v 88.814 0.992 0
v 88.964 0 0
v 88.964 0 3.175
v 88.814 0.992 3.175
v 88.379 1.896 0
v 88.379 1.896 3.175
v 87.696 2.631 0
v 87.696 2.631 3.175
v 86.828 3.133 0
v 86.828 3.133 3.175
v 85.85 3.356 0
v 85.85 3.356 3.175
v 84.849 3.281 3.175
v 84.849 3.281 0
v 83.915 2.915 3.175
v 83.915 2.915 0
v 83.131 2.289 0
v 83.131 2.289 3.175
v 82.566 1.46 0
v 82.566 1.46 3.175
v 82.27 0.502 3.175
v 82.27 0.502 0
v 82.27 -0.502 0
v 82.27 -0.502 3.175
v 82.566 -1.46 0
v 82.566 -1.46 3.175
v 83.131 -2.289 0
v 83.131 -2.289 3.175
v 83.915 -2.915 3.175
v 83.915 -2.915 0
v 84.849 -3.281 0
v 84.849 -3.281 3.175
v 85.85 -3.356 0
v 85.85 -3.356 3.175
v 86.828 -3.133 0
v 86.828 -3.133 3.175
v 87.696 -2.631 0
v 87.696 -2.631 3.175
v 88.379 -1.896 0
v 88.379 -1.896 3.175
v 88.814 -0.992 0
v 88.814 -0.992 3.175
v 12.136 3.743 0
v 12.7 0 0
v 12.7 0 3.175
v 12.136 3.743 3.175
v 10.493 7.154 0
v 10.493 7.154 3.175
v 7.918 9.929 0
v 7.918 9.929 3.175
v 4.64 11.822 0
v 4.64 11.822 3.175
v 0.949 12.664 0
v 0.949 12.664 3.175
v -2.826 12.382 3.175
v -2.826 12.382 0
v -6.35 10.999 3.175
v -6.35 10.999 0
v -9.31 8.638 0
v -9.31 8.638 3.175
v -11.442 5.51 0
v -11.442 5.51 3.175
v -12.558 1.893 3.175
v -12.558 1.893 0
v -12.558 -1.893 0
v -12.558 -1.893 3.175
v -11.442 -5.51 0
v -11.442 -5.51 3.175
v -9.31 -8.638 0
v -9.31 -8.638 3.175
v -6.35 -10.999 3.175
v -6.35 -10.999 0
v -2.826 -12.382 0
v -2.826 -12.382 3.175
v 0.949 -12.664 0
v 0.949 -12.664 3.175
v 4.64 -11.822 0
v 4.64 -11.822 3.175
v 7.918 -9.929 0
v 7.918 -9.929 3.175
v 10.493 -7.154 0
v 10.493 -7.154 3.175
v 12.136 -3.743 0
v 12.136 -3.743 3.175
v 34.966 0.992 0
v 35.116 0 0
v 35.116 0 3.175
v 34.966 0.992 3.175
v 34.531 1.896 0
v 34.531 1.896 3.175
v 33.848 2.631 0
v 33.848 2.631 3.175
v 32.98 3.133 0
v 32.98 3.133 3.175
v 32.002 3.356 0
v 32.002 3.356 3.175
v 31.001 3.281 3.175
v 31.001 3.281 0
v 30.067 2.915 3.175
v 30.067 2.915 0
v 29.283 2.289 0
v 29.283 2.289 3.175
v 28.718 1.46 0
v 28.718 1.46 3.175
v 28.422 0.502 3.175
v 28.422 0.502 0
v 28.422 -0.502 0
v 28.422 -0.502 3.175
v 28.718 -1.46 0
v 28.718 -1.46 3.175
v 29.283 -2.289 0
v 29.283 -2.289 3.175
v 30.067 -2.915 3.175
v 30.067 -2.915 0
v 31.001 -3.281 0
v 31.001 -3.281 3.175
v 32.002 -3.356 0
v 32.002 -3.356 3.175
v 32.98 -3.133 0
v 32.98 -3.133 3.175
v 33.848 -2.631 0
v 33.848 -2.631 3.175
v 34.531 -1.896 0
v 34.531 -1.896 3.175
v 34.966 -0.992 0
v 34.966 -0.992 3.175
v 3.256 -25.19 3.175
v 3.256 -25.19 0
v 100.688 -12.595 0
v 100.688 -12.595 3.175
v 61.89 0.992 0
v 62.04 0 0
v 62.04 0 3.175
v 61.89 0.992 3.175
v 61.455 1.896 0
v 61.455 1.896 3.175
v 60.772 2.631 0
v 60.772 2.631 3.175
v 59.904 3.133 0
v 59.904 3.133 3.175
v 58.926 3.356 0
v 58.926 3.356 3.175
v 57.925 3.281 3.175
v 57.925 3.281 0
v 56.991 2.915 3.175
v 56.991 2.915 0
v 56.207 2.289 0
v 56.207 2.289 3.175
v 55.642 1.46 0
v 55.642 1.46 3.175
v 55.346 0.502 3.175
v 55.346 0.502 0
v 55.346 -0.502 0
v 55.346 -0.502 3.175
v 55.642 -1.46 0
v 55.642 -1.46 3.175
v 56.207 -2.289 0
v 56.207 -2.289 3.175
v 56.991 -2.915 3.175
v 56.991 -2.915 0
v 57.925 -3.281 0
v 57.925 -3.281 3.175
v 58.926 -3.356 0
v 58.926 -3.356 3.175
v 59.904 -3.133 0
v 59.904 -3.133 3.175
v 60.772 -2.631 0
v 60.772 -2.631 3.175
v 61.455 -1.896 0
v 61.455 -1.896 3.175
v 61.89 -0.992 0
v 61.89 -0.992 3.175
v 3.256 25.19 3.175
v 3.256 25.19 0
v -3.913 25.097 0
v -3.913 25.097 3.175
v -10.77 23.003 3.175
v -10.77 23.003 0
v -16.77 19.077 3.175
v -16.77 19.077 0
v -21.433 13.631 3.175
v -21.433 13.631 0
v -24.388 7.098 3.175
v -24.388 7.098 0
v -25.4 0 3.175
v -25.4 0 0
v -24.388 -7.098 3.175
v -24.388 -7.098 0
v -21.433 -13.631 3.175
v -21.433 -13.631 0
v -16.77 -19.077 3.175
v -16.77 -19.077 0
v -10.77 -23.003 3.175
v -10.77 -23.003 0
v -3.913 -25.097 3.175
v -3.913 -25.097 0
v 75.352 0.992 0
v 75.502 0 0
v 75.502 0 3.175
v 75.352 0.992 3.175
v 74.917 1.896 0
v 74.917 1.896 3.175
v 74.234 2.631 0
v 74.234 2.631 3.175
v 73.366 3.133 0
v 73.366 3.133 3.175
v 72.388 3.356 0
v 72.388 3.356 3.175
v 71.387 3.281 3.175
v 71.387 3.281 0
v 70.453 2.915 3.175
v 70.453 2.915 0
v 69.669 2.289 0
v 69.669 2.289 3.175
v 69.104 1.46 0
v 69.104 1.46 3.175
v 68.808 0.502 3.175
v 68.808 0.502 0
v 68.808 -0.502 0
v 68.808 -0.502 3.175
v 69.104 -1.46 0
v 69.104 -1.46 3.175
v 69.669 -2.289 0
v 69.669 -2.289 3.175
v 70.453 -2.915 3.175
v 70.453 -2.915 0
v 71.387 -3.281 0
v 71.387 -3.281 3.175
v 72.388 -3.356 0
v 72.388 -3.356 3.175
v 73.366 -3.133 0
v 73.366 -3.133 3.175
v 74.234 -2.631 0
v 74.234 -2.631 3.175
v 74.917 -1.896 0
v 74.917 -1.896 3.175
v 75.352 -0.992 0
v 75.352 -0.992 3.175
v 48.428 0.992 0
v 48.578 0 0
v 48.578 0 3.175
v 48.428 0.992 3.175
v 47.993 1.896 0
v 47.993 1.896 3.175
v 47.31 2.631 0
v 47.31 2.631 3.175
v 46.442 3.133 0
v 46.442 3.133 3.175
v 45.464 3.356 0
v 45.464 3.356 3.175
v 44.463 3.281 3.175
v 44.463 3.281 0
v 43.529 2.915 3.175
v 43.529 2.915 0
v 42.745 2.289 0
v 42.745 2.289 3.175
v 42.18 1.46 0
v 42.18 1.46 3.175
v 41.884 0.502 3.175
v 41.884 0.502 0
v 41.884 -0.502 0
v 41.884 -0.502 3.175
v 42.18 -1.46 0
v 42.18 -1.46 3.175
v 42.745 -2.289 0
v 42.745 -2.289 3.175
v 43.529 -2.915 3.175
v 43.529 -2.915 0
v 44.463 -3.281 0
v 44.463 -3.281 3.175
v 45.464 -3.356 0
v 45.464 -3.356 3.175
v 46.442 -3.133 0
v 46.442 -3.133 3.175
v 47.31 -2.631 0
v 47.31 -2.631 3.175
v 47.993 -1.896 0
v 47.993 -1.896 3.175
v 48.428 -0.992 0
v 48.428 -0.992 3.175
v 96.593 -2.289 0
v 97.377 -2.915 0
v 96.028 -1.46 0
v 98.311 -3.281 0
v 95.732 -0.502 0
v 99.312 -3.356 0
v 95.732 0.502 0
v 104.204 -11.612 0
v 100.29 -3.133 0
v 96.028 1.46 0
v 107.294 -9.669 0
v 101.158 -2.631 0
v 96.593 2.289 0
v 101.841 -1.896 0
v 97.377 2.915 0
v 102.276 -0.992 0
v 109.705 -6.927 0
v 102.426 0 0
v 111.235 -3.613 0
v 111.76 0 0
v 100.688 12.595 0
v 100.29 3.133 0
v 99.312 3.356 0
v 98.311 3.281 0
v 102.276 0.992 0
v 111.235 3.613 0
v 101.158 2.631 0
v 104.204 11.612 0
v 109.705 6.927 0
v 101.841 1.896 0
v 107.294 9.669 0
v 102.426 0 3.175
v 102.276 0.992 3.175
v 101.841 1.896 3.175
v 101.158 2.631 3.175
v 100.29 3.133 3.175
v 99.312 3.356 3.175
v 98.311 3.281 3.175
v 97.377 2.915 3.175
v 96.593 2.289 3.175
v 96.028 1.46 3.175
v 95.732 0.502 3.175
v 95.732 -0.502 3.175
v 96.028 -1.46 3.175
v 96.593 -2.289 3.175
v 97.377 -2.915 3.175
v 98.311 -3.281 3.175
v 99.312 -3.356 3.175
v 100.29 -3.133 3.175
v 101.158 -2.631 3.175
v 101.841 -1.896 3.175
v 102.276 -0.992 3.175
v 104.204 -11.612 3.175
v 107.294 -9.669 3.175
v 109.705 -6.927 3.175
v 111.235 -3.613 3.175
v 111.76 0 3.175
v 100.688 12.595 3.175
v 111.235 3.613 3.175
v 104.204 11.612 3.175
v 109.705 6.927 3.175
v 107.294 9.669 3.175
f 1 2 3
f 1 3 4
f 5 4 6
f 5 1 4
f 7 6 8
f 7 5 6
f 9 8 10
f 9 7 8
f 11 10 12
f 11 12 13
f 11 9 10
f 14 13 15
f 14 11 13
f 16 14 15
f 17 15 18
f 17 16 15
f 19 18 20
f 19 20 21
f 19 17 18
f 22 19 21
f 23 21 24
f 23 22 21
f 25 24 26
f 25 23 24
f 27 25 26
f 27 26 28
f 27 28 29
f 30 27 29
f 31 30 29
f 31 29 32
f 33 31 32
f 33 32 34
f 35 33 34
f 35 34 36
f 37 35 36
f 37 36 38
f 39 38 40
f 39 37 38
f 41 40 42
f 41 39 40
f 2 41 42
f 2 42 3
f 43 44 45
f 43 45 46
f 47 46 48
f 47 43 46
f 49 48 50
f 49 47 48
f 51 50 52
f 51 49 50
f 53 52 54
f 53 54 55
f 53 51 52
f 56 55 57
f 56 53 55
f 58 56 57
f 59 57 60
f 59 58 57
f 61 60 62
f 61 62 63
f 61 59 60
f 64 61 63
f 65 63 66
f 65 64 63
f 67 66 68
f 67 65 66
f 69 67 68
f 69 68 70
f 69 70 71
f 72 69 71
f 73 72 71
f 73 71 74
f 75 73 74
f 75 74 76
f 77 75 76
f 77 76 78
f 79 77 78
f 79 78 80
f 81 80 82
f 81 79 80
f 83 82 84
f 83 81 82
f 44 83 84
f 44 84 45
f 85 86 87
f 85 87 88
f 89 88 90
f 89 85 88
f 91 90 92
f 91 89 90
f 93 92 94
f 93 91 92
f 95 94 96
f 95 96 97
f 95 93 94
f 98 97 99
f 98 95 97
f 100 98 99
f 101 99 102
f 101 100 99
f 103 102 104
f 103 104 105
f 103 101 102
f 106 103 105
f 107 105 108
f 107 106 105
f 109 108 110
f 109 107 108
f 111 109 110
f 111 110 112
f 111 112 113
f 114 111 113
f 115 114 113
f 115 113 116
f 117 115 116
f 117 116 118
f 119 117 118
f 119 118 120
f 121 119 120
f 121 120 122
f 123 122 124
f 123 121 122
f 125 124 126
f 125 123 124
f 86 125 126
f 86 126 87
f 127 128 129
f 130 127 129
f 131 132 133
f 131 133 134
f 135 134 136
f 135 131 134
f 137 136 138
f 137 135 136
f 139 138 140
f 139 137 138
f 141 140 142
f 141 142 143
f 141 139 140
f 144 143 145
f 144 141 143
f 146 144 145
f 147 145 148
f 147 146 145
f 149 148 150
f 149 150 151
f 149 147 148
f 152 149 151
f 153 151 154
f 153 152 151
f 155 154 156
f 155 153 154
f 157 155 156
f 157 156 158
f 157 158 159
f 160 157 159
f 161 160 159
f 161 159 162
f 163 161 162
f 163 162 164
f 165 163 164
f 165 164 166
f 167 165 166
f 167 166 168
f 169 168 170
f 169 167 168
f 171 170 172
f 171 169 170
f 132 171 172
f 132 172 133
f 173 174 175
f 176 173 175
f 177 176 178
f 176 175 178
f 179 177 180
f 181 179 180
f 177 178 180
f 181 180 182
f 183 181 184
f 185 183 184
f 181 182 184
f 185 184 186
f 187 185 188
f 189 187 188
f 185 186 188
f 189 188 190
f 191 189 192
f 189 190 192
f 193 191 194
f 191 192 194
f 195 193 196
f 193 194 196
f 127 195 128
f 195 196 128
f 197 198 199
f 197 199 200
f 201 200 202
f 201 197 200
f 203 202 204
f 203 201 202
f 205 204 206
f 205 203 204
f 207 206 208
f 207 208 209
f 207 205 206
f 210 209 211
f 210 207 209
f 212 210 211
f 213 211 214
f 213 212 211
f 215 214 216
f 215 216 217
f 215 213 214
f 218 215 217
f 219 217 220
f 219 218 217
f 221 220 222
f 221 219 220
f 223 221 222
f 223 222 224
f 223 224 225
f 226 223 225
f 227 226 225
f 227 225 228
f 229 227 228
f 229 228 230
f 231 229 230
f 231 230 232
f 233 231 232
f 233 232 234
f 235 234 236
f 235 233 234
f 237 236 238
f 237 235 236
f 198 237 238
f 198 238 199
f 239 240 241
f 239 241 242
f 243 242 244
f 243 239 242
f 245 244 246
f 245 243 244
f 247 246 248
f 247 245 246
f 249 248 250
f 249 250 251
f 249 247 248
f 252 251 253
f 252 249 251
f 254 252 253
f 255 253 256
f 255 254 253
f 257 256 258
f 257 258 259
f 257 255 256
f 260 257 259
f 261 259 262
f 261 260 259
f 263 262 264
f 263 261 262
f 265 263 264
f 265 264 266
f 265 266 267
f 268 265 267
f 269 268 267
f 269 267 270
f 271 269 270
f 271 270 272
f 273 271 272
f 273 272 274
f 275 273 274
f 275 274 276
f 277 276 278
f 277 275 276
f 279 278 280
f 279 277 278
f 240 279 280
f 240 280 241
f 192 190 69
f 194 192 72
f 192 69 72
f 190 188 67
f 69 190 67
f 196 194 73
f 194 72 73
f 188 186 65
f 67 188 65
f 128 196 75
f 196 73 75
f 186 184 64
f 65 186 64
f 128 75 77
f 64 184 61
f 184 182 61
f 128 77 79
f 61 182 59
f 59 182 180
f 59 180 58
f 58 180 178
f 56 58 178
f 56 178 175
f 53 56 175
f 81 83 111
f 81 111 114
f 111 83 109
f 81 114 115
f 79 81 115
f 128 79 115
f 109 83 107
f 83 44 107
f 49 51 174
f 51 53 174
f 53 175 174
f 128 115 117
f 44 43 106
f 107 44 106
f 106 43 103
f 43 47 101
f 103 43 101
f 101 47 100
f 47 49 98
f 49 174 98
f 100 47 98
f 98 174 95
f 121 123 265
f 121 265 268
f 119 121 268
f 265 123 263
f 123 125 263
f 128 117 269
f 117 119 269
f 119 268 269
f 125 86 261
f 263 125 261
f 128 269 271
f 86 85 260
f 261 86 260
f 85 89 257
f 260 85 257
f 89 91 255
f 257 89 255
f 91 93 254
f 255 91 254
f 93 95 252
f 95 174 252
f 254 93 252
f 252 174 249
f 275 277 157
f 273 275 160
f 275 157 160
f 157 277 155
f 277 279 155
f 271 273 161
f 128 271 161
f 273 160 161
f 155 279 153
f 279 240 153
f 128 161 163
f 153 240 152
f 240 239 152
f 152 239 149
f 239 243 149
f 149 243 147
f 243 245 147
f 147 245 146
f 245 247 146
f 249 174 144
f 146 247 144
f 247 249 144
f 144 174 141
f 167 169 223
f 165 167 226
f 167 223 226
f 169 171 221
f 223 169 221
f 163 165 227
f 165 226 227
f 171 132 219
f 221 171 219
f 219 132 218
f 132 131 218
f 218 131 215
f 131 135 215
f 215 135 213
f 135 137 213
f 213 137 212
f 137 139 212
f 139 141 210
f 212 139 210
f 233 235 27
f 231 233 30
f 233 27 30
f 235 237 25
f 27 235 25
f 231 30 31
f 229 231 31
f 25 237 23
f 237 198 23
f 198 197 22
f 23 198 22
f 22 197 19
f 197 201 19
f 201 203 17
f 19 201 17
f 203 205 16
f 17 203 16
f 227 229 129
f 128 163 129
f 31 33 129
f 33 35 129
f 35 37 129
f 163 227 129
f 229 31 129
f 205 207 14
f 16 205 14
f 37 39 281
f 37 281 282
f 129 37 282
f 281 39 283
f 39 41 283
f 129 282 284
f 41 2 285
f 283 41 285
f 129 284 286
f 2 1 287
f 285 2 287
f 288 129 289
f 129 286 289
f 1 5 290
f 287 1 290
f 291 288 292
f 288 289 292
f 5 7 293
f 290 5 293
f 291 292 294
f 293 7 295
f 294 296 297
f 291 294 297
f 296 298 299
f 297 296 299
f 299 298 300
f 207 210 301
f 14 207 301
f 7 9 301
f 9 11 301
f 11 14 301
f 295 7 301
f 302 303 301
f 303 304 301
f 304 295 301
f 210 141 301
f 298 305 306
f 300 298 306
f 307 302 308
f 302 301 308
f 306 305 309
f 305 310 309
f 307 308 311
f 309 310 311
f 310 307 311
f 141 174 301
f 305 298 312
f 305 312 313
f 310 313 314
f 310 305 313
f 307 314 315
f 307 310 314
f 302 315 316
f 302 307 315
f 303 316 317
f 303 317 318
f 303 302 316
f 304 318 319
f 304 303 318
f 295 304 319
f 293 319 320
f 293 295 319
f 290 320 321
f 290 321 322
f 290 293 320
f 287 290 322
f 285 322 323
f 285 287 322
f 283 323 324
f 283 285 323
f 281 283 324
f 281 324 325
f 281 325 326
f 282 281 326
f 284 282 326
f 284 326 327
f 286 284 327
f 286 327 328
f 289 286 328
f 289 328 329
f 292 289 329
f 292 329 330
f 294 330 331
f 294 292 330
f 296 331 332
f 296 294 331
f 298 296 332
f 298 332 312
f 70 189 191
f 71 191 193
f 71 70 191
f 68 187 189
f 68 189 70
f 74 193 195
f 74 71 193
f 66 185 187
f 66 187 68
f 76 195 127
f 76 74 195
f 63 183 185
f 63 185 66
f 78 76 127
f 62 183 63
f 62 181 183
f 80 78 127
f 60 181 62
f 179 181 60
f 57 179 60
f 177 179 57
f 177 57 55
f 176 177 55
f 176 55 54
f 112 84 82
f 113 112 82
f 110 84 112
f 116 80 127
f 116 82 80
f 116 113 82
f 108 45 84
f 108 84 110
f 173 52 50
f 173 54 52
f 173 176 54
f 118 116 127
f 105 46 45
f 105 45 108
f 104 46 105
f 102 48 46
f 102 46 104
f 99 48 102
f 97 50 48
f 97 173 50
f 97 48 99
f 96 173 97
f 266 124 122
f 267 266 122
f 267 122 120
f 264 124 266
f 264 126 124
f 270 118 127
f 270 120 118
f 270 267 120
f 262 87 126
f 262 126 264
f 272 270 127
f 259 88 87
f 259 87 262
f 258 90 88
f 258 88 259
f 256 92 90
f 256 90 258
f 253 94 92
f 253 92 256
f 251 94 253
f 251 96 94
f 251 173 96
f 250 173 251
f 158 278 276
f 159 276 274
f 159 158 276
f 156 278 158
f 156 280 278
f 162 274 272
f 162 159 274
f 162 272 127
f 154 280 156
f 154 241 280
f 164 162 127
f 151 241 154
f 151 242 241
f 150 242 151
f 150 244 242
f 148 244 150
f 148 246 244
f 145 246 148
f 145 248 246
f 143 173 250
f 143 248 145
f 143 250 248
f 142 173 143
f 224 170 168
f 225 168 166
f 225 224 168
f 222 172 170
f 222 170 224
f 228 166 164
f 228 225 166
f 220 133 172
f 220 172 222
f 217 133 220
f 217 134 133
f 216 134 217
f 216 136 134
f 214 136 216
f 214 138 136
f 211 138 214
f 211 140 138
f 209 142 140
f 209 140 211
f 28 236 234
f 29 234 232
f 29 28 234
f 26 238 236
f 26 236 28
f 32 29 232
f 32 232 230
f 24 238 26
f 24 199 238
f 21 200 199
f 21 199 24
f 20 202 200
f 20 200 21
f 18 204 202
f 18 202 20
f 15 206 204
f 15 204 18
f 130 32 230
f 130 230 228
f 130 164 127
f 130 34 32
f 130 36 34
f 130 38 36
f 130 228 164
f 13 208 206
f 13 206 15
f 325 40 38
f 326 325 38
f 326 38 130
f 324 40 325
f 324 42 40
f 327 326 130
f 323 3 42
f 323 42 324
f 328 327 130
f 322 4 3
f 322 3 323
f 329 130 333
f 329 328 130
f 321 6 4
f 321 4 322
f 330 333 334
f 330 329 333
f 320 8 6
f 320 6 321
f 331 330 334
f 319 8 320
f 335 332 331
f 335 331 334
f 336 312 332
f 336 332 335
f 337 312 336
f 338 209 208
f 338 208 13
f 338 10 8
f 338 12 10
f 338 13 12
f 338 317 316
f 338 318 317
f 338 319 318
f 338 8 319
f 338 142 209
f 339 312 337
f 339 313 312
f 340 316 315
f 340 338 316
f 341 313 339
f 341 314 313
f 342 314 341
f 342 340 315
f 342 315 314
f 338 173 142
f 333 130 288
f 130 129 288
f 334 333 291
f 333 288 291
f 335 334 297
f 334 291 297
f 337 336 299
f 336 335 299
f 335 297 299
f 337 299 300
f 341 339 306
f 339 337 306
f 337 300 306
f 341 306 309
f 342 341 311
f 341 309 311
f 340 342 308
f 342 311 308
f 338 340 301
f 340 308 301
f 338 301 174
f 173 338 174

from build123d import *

# Parameters (mm, degrees)
FLAT_SKETCH_R           = 25.4
FLAT_SKETCH_R_2         = 12.7
FLAT_SKETCH_R_3         = 3.3655
EXTRUDE_FACE_DEPTH      = 3.175
FLAT_SKETCH_4_R         = 3.3655
EXTRUDE_CUT_HOLES_DEPTH = 3.175


with BuildPart() as part:
    # Flat sketch → Extrude face (new body)
    # profile 1 of 13: a face of its own
    with BuildSketch(Plane.XY):
        Circle(FLAT_SKETCH_R)
        Circle(FLAT_SKETCH_R_2, mode=Mode.SUBTRACT)
    # profile 2 of 13: a face of its own
    with BuildSketch(Plane.XY):
        with BuildLine():
            Line((100.688205128, 12.595195436), (3.256410256, 25.190390871))
            ThreePointArc((3.256410256, 25.190390871), (19.077117451, 16.769722411), (25.4, 0))
            ThreePointArc((25.4, 0), (19.077117451, -16.769722411), (3.256410256, -25.190390871))
            Line((3.256410256, -25.190390871), (100.688205128, -12.595195436))
            ThreePointArc((100.688205128, -12.595195436), (91.936966729, -10.514389997), (86.759121462, -3.158858528))
            ThreePointArc((86.759121462, -3.158858528), (82.2325, 0), (86.759121462, 3.158858528))
            ThreePointArc((86.759121462, 3.158858528), (91.936966729, 10.514389997), (100.688205128, 12.595195436))
        make_face()
        with Locations((31.75, 0)):
            Circle(FLAT_SKETCH_R_3, mode=Mode.SUBTRACT)
        with Locations((45.212, 0)):
            Circle(FLAT_SKETCH_R_3, mode=Mode.SUBTRACT)
        with Locations((58.674, 0)):
            Circle(FLAT_SKETCH_R_3, mode=Mode.SUBTRACT)
        with Locations((72.136, 0)):
            Circle(FLAT_SKETCH_R_3, mode=Mode.SUBTRACT)
    # profile 3 of 13: a face of its own
    with BuildSketch(Plane.XY):
        with Locations((31.75, 0)):
            Circle(FLAT_SKETCH_R_3)
    # profile 4 of 13: a face of its own
    with BuildSketch(Plane.XY):
        with Locations((45.212, 0)):
            Circle(FLAT_SKETCH_R_3)
    # profile 5 of 13: a face of its own
    with BuildSketch(Plane.XY):
        with Locations((58.674, 0)):
            Circle(FLAT_SKETCH_R_3)
    # profile 6 of 13: a face of its own
    with BuildSketch(Plane.XY):
        with Locations((72.136, 0)):
            Circle(FLAT_SKETCH_R_3)
    # profile 7 of 13: a face of its own
    with BuildSketch(Plane.XY):
        with Locations((99.06, 0)):
            Circle(FLAT_SKETCH_R_2)
    # profile 8 of 13: a face of its own
    with BuildSketch(Plane.XY):
        with Locations((85.598, 0)):
            Circle(FLAT_SKETCH_R_3)
    # profile 9 of 13: a face of its own
    with BuildSketch(Plane.XY):
        with Locations((85.598, 0)):
            Circle(FLAT_SKETCH_R_3)
    # profile 10 of 13: a face of its own
    with BuildSketch(Plane.XY):
        with Locations((99.06, 0)):
            Circle(FLAT_SKETCH_R_2)
    # profile 11 of 13: a face of its own
    with BuildSketch(Plane.XY):
        with Locations((99.06, 0)):
            Circle(FLAT_SKETCH_R_2)
        with Locations((99.06, 0)):
            Circle(FLAT_SKETCH_R_3, mode=Mode.SUBTRACT)
    # profile 12 of 13: a face of its own
    with BuildSketch(Plane.XY):
        with Locations((85.598, 0)):
            Circle(FLAT_SKETCH_R_3)
    # profile 13 of 13: a face of its own
    with BuildSketch(Plane.XY):
        with Locations((99.06, 0)):
            Circle(FLAT_SKETCH_R_3)
    extrude(amount=EXTRUDE_FACE_DEPTH)

    # Flat sketch<4> → Extrude cut - holes (cut)
    with BuildSketch(Plane.XY):
        with Locations((99.06, 0)):
            Circle(FLAT_SKETCH_4_R)
        with Locations((85.598, 0)):
            Circle(FLAT_SKETCH_4_R)
        with Locations((72.136, 0)):
            Circle(FLAT_SKETCH_4_R)
        with Locations((58.674, 0)):
            Circle(FLAT_SKETCH_4_R)
        with Locations((45.212, 0)):
            Circle(FLAT_SKETCH_4_R)
        with Locations((31.75, 0)):
            Circle(FLAT_SKETCH_4_R)
    extrude(amount=EXTRUDE_CUT_HOLES_DEPTH, mode=Mode.SUBTRACT)


solid = part.part
